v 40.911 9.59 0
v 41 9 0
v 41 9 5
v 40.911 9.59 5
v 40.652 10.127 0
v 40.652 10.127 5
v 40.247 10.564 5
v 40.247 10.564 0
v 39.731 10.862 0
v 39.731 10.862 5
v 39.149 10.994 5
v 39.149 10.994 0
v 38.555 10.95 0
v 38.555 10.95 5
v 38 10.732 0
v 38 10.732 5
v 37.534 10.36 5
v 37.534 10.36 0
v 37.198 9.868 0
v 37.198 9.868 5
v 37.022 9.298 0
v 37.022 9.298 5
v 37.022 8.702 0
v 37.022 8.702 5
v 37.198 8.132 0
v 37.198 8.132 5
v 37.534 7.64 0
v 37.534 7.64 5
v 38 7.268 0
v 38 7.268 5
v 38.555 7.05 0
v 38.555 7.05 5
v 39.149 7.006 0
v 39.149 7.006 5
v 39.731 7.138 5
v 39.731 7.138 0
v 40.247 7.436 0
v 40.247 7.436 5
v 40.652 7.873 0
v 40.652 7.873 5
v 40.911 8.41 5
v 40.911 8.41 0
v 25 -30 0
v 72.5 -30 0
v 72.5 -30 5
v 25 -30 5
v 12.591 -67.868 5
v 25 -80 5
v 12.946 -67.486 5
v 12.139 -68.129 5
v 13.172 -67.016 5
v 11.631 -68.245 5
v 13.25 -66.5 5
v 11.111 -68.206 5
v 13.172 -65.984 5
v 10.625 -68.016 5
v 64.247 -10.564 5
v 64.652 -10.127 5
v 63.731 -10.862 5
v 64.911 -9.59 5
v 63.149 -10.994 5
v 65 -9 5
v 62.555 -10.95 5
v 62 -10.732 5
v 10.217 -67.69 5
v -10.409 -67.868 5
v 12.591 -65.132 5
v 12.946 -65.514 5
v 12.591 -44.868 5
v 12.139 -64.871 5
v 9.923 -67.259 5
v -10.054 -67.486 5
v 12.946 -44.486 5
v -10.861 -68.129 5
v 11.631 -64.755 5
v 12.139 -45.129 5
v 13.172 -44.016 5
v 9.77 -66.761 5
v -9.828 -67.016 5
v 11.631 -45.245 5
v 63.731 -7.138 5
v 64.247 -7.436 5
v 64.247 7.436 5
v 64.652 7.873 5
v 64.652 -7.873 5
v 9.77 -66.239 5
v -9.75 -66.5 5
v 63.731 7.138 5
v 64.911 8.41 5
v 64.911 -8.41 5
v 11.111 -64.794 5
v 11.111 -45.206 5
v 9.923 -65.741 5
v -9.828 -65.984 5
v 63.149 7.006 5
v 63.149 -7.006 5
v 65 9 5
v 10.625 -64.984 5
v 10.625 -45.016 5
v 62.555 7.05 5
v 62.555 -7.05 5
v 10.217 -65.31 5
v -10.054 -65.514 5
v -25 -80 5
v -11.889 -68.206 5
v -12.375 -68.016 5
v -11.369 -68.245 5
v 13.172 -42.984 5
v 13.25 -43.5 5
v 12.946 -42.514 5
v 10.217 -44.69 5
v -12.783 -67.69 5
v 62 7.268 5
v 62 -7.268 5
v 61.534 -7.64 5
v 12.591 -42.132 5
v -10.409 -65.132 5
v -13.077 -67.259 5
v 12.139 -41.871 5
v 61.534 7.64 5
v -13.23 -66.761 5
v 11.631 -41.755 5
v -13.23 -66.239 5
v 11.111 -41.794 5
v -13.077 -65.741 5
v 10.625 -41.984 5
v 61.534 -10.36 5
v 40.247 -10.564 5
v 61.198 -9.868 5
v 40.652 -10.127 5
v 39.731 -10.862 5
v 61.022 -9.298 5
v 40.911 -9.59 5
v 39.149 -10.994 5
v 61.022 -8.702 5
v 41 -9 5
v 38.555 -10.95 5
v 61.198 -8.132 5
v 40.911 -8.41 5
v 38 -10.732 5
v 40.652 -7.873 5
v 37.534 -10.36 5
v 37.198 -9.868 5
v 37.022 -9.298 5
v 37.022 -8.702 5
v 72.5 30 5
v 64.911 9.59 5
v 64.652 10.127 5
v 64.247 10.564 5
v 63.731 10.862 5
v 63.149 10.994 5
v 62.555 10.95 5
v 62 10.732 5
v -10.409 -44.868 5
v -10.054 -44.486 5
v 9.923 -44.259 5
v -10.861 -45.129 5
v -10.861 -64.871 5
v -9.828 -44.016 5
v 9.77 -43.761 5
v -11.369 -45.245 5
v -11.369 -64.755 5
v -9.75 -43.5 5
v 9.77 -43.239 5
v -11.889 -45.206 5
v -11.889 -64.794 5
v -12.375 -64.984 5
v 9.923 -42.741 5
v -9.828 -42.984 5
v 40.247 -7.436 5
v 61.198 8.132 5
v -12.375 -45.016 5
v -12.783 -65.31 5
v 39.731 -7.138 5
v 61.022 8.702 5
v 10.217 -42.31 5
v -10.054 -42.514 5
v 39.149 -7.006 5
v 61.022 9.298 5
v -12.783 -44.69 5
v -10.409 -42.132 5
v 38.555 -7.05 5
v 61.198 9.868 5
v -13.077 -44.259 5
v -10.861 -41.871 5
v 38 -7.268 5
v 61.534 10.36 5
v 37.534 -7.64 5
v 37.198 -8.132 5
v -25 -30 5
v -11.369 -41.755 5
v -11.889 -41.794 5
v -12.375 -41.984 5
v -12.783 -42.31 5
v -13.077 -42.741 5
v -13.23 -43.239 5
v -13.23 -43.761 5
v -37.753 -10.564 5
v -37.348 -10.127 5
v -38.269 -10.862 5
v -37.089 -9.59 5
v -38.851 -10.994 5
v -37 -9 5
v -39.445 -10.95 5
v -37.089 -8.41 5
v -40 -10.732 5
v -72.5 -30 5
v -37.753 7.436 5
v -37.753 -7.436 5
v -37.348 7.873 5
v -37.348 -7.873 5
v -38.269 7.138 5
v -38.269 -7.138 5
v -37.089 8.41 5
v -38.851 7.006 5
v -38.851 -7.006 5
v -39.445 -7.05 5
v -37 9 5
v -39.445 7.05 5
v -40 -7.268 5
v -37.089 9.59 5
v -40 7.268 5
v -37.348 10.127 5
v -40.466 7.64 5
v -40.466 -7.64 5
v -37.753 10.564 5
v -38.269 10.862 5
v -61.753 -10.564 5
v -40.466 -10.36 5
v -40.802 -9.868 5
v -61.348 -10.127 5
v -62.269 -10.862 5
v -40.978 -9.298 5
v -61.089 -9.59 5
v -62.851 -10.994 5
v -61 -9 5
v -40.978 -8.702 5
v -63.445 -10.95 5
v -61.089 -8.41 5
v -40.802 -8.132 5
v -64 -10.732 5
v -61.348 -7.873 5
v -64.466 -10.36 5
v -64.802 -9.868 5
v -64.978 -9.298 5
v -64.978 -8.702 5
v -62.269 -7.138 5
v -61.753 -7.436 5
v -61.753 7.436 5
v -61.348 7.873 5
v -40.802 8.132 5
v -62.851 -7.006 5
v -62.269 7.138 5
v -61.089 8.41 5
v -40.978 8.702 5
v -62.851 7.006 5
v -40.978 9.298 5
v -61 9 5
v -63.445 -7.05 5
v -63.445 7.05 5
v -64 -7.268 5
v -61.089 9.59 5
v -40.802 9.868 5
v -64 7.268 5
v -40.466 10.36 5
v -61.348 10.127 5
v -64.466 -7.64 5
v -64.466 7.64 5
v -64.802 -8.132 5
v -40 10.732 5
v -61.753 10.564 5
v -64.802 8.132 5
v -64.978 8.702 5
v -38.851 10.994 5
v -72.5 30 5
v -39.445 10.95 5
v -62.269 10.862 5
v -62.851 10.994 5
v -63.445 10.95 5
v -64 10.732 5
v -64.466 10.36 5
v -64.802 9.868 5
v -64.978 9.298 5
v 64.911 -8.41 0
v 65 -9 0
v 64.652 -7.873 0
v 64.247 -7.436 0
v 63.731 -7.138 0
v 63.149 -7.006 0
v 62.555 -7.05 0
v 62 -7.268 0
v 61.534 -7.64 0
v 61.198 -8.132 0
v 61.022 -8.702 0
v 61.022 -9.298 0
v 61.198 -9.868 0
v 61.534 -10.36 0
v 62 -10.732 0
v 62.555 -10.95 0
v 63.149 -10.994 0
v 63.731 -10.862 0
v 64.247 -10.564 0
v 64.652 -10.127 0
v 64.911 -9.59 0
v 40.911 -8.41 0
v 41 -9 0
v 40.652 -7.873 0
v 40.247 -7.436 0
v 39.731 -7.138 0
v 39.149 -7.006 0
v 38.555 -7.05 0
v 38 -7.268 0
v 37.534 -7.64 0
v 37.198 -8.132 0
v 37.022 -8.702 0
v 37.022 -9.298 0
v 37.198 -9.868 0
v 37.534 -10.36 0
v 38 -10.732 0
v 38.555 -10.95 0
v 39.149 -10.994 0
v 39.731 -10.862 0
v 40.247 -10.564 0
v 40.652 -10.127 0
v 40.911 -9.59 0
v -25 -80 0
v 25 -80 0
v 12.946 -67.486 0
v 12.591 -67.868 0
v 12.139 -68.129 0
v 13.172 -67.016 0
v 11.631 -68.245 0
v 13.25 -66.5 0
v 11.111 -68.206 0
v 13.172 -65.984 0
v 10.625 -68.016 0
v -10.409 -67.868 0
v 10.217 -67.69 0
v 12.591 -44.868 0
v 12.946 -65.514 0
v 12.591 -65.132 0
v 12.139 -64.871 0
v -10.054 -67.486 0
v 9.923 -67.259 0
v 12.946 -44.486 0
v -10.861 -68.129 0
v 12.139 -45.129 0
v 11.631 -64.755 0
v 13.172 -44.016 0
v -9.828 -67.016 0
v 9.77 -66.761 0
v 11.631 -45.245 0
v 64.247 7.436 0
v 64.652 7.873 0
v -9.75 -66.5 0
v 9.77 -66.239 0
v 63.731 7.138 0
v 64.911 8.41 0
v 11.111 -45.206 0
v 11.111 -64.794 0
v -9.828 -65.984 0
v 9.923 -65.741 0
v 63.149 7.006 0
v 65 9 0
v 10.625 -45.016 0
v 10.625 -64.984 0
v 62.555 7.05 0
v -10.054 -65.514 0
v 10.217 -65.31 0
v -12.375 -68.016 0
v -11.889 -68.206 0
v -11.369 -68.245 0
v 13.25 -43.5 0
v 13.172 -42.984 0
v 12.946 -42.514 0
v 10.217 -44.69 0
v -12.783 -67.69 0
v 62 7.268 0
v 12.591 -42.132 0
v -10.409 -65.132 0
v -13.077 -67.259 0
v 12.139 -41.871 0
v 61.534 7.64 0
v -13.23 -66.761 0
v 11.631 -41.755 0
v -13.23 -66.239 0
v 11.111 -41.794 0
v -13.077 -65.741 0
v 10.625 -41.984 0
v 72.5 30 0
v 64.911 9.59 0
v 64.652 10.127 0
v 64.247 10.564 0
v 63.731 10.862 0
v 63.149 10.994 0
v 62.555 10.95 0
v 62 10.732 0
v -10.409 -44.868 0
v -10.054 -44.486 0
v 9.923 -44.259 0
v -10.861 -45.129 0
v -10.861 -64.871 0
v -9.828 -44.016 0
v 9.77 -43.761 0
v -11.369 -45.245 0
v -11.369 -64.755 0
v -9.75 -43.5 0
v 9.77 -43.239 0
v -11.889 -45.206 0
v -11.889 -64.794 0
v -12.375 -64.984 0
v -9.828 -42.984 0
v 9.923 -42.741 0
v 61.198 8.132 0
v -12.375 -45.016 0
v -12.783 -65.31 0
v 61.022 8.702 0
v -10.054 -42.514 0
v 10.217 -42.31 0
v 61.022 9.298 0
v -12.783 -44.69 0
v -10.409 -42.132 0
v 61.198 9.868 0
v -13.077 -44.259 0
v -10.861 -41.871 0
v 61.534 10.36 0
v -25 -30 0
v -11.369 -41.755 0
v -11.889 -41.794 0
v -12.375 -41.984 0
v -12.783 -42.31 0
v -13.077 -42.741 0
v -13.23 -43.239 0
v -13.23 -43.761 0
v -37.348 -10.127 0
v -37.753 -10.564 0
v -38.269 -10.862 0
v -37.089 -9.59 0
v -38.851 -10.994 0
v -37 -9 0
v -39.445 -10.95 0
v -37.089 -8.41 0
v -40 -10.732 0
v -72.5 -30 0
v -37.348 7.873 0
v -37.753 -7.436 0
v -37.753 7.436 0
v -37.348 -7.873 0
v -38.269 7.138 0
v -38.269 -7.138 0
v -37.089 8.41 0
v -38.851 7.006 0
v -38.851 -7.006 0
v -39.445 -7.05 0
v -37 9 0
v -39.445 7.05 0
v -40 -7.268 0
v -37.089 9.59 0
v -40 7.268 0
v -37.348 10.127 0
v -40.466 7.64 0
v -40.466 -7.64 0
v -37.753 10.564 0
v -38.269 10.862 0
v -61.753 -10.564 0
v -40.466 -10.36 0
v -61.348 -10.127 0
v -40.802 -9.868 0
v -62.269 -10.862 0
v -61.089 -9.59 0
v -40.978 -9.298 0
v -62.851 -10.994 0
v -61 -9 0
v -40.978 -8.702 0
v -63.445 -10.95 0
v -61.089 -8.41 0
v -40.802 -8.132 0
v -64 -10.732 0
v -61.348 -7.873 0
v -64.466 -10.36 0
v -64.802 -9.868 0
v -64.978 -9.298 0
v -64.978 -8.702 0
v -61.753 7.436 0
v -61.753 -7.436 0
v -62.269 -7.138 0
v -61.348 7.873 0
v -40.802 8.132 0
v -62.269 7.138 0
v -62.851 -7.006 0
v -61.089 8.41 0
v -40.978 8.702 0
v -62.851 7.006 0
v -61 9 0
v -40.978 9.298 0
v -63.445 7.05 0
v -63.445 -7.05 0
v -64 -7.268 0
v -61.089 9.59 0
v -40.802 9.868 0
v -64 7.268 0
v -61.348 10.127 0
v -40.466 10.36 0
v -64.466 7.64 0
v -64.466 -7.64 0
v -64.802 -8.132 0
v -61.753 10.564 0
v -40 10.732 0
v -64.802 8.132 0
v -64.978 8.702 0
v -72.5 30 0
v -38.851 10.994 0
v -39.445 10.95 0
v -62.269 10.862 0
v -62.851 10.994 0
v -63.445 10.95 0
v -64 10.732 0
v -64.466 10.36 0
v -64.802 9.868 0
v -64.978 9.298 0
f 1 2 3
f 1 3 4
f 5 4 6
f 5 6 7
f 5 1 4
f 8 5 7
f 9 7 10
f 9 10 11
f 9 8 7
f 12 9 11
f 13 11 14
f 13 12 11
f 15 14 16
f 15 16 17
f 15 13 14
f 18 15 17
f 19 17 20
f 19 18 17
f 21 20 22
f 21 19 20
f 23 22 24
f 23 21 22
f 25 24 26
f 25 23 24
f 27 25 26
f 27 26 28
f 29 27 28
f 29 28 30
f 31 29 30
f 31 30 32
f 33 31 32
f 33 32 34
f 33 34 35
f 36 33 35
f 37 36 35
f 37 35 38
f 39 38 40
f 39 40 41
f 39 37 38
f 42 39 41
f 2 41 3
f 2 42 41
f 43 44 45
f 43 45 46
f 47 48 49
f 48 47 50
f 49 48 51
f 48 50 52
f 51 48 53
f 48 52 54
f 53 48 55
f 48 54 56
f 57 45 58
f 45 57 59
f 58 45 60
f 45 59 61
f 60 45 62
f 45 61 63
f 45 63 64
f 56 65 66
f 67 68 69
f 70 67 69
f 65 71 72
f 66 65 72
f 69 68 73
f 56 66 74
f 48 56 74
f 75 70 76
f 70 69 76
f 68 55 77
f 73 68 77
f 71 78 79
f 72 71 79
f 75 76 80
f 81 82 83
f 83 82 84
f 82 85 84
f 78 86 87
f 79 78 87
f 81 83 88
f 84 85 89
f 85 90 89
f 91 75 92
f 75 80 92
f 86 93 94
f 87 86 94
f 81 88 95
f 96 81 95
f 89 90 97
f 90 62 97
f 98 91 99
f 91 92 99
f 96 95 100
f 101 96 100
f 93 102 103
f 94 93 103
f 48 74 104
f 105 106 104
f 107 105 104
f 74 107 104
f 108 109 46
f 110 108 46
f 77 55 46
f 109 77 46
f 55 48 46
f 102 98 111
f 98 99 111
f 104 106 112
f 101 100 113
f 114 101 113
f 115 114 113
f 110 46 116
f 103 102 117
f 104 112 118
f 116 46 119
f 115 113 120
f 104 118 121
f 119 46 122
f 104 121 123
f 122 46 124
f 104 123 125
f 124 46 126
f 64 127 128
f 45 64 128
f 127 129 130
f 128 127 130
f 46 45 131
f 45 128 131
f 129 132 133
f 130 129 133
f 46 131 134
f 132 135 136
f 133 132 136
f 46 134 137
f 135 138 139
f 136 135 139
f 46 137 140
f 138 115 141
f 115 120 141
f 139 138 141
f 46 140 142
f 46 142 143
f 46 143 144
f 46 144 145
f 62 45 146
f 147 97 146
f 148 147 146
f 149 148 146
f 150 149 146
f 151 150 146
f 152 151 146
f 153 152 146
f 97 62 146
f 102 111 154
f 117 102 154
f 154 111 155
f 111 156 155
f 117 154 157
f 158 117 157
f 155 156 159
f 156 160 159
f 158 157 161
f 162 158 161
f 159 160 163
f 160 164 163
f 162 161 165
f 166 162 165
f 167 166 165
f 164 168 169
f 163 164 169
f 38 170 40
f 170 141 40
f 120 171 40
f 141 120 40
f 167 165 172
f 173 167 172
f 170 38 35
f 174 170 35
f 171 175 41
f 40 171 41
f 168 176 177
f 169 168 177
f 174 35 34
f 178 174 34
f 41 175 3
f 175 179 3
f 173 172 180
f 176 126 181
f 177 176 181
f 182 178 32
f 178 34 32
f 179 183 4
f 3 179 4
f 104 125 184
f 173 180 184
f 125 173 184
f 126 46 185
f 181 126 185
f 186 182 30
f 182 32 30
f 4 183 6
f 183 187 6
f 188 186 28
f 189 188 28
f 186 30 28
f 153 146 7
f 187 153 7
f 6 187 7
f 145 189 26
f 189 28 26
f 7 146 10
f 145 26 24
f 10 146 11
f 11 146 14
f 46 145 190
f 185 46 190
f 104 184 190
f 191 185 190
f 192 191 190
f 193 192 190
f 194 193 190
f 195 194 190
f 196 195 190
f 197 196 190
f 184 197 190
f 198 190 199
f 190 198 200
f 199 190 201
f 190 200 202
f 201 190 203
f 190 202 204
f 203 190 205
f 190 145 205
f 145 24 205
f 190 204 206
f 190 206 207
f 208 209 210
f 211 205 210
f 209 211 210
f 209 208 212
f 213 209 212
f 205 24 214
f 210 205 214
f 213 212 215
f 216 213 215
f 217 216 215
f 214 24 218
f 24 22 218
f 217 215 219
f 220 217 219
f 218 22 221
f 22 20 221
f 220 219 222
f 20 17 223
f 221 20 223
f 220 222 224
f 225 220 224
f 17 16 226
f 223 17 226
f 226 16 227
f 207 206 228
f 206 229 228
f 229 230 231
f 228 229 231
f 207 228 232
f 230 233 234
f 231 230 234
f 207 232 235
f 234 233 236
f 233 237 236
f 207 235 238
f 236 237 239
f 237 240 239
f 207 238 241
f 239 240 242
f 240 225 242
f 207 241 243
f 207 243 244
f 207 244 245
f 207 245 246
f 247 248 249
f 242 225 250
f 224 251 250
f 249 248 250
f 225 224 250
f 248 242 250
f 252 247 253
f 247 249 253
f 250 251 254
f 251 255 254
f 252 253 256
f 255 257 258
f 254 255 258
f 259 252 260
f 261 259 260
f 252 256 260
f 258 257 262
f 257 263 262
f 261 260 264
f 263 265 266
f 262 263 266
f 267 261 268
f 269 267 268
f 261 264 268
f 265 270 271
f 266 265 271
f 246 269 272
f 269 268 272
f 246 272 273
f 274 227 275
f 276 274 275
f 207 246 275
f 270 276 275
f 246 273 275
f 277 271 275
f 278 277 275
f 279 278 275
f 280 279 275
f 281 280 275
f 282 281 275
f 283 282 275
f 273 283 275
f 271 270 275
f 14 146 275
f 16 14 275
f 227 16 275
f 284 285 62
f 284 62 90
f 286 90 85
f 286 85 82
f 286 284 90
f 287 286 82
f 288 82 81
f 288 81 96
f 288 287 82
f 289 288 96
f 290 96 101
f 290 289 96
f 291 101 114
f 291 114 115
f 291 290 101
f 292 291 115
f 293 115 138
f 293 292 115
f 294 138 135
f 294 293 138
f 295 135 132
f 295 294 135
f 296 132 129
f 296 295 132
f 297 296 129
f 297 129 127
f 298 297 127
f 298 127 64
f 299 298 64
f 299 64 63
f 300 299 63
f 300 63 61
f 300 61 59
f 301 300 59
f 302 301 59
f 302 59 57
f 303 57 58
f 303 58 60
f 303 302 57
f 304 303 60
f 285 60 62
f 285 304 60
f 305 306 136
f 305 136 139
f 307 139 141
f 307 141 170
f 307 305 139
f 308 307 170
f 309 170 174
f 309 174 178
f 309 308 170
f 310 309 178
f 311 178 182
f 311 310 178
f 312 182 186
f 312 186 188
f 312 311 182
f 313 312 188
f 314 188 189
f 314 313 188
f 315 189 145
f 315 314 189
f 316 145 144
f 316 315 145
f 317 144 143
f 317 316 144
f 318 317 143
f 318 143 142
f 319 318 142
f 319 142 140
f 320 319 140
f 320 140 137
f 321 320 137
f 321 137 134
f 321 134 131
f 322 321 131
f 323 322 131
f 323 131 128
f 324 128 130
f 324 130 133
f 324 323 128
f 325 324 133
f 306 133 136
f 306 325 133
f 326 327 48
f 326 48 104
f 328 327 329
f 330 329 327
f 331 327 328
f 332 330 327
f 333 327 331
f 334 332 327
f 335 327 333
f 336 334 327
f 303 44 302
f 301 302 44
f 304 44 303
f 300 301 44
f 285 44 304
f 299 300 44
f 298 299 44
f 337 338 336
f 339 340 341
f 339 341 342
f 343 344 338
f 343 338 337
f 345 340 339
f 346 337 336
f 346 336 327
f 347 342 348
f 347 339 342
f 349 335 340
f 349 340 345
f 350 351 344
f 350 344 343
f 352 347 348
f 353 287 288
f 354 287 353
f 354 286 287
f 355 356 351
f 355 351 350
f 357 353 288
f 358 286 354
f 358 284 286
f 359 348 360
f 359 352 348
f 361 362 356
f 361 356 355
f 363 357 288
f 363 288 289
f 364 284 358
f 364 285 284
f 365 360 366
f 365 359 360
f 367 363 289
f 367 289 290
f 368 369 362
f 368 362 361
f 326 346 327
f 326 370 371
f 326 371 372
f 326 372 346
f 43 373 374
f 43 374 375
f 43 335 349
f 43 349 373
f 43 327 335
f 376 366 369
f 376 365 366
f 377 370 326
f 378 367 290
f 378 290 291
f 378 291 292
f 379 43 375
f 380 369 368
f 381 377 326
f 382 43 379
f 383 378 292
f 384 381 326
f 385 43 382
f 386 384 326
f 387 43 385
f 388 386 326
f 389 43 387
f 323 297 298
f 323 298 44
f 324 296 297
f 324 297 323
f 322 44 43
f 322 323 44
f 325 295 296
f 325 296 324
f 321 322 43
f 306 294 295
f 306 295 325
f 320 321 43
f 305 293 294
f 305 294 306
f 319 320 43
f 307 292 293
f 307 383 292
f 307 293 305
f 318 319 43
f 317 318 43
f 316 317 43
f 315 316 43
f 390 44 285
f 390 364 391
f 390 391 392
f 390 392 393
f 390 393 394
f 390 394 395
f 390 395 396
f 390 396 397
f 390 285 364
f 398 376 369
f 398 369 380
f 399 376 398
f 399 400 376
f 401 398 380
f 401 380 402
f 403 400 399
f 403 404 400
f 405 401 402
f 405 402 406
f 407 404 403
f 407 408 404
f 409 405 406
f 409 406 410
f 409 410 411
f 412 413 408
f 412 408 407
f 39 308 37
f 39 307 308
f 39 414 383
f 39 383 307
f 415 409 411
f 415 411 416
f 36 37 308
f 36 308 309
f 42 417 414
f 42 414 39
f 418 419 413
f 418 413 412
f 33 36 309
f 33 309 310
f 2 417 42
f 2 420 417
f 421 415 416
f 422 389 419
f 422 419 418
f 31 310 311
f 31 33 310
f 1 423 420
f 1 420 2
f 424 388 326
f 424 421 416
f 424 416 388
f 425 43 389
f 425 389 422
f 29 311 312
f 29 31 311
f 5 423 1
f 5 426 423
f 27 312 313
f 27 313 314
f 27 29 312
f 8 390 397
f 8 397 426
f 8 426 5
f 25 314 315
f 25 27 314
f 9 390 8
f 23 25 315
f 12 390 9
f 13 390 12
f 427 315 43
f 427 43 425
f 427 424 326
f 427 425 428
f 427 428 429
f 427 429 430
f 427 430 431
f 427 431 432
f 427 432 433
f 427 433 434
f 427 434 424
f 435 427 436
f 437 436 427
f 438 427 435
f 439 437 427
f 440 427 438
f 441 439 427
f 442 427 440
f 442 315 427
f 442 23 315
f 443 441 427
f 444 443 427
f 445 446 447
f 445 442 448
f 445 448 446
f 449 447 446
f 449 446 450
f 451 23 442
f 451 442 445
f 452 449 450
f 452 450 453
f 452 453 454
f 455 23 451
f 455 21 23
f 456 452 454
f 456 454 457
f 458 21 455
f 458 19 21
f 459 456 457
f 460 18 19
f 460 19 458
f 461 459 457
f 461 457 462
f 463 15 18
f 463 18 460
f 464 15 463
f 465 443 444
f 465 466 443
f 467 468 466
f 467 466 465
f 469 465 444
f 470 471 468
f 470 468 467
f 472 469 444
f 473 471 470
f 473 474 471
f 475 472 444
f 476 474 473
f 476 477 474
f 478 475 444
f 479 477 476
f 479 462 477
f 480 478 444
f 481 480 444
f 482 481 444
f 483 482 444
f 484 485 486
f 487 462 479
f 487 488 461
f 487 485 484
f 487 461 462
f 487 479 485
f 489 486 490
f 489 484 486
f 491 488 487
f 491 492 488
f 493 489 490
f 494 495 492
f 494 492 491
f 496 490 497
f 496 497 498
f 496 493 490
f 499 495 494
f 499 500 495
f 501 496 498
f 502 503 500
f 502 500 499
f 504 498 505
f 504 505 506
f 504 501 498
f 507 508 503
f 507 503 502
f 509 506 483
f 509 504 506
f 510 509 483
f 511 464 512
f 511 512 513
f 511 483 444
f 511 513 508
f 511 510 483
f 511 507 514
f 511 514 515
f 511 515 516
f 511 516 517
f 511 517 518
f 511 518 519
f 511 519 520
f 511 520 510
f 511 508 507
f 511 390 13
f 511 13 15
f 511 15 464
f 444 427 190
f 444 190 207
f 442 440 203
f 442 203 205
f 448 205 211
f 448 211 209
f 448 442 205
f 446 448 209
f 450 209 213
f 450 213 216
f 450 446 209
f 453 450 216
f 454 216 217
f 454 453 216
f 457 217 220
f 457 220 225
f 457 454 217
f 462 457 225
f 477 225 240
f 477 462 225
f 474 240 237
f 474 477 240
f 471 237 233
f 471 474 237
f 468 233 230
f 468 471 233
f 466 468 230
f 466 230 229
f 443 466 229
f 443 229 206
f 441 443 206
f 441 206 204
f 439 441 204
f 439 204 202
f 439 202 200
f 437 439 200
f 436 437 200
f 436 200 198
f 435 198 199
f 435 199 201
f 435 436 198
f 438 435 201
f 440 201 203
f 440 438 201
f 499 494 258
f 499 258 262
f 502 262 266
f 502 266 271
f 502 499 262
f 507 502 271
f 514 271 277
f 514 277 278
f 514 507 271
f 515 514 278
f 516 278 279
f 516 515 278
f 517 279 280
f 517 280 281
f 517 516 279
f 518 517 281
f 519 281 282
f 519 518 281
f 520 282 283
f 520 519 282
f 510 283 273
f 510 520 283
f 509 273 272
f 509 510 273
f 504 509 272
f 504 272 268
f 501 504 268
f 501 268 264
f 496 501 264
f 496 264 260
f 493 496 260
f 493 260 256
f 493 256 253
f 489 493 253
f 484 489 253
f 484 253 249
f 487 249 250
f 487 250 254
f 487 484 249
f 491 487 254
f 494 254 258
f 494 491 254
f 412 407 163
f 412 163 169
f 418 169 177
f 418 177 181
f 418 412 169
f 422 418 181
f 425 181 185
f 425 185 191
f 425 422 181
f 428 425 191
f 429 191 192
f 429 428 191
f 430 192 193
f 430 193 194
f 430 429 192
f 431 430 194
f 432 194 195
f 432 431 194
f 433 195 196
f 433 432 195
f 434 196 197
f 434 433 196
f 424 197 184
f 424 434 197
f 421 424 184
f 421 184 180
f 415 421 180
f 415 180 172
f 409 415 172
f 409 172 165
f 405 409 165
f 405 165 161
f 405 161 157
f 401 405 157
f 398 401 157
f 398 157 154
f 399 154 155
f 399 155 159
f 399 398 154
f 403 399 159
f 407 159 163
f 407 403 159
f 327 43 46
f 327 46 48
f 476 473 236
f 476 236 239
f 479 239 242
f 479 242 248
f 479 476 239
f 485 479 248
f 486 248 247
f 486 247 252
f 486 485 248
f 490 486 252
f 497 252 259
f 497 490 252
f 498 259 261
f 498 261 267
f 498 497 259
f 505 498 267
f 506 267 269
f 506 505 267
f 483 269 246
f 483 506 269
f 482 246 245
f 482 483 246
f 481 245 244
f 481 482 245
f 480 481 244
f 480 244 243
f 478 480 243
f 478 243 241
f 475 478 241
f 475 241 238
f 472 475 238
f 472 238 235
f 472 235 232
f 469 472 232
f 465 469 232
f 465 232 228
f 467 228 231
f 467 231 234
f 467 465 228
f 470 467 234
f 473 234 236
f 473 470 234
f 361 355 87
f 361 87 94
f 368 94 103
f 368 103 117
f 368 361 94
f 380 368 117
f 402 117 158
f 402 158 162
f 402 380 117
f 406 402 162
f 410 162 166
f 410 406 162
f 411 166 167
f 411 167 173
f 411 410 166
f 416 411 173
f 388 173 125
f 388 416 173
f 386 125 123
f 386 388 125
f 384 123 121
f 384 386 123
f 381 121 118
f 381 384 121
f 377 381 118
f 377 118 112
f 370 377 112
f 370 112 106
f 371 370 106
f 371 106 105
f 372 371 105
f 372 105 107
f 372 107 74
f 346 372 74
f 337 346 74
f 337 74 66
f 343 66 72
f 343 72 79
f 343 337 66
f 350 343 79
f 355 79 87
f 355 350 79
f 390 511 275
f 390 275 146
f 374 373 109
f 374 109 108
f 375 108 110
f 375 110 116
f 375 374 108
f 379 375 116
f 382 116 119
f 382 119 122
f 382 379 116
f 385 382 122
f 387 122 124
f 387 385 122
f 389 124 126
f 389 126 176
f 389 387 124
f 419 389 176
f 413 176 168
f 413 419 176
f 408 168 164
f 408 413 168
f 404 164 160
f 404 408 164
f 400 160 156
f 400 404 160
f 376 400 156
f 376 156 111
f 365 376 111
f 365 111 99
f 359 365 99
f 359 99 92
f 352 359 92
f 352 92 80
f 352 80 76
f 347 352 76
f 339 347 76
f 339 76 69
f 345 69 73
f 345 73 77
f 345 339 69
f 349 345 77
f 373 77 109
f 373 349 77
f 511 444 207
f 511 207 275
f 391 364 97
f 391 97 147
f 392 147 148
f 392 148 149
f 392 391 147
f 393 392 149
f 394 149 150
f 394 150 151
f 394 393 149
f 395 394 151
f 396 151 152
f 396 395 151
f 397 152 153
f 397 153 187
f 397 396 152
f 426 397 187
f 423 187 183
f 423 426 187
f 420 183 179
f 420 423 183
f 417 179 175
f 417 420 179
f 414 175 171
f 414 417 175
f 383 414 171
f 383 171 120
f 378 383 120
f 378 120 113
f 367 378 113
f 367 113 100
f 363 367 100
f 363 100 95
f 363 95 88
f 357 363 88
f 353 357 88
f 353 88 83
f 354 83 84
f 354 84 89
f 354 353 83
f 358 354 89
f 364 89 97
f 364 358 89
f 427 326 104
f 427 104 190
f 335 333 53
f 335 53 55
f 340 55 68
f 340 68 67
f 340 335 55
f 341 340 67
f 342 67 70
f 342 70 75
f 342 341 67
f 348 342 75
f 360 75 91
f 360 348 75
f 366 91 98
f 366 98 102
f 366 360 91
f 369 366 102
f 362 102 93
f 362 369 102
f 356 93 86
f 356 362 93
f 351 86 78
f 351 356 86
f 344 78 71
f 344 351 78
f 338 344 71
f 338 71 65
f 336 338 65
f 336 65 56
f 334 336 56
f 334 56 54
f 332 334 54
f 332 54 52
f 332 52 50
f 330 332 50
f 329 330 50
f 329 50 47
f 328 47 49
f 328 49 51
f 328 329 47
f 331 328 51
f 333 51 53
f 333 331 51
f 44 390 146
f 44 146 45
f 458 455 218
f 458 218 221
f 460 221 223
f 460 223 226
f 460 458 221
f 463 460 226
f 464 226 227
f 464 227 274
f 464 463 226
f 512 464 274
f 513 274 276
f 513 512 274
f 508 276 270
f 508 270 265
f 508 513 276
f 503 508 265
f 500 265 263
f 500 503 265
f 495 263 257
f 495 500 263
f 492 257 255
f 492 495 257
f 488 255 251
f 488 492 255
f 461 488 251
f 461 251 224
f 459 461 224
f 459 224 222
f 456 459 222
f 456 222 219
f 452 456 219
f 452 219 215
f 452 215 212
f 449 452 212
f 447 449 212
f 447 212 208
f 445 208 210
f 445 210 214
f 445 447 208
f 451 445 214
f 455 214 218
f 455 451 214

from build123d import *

# Parameters (mm, degrees)
SKETCH1_R           = 1.75
SKETCH1_R_2         = 2
BOSS_EXTRUDE1_DEPTH = 5


with BuildPart() as part:
    # Sketch1 → Boss-Extrude1 (new body)
    with BuildSketch(Plane.XY):
        Polygon((-72.5, 30), (72.5, 30), (72.5, -30), (25, -30), (25, -80), (-25, -80), (-25, -30), (-72.5, -30), align=None)
        with Locations((-11.5, -66.5)):
            Circle(SKETCH1_R, mode=Mode.SUBTRACT)
        with Locations((11.5, -66.5)):
            Circle(SKETCH1_R, mode=Mode.SUBTRACT)
        with Locations((11.5, -43.5)):
            Circle(SKETCH1_R, mode=Mode.SUBTRACT)
        with Locations((-11.5, -43.5)):
            Circle(SKETCH1_R, mode=Mode.SUBTRACT)
        with Locations((-63, 9)):
            Circle(SKETCH1_R_2, mode=Mode.SUBTRACT)
        with Locations((-39, 9)):
            Circle(SKETCH1_R_2, mode=Mode.SUBTRACT)
        with Locations((-39, -9)):
            Circle(SKETCH1_R_2, mode=Mode.SUBTRACT)
        with Locations((-63, -9)):
            Circle(SKETCH1_R_2, mode=Mode.SUBTRACT)
        with Locations((63, -9)):
            Circle(SKETCH1_R_2, mode=Mode.SUBTRACT)
        with Locations((39, -9)):
            Circle(SKETCH1_R_2, mode=Mode.SUBTRACT)
        with Locations((39, 9)):
            Circle(SKETCH1_R_2, mode=Mode.SUBTRACT)
        with Locations((63, 9)):
            Circle(SKETCH1_R_2, mode=Mode.SUBTRACT)
    extrude(amount=BOSS_EXTRUDE1_DEPTH)


solid = part.part
